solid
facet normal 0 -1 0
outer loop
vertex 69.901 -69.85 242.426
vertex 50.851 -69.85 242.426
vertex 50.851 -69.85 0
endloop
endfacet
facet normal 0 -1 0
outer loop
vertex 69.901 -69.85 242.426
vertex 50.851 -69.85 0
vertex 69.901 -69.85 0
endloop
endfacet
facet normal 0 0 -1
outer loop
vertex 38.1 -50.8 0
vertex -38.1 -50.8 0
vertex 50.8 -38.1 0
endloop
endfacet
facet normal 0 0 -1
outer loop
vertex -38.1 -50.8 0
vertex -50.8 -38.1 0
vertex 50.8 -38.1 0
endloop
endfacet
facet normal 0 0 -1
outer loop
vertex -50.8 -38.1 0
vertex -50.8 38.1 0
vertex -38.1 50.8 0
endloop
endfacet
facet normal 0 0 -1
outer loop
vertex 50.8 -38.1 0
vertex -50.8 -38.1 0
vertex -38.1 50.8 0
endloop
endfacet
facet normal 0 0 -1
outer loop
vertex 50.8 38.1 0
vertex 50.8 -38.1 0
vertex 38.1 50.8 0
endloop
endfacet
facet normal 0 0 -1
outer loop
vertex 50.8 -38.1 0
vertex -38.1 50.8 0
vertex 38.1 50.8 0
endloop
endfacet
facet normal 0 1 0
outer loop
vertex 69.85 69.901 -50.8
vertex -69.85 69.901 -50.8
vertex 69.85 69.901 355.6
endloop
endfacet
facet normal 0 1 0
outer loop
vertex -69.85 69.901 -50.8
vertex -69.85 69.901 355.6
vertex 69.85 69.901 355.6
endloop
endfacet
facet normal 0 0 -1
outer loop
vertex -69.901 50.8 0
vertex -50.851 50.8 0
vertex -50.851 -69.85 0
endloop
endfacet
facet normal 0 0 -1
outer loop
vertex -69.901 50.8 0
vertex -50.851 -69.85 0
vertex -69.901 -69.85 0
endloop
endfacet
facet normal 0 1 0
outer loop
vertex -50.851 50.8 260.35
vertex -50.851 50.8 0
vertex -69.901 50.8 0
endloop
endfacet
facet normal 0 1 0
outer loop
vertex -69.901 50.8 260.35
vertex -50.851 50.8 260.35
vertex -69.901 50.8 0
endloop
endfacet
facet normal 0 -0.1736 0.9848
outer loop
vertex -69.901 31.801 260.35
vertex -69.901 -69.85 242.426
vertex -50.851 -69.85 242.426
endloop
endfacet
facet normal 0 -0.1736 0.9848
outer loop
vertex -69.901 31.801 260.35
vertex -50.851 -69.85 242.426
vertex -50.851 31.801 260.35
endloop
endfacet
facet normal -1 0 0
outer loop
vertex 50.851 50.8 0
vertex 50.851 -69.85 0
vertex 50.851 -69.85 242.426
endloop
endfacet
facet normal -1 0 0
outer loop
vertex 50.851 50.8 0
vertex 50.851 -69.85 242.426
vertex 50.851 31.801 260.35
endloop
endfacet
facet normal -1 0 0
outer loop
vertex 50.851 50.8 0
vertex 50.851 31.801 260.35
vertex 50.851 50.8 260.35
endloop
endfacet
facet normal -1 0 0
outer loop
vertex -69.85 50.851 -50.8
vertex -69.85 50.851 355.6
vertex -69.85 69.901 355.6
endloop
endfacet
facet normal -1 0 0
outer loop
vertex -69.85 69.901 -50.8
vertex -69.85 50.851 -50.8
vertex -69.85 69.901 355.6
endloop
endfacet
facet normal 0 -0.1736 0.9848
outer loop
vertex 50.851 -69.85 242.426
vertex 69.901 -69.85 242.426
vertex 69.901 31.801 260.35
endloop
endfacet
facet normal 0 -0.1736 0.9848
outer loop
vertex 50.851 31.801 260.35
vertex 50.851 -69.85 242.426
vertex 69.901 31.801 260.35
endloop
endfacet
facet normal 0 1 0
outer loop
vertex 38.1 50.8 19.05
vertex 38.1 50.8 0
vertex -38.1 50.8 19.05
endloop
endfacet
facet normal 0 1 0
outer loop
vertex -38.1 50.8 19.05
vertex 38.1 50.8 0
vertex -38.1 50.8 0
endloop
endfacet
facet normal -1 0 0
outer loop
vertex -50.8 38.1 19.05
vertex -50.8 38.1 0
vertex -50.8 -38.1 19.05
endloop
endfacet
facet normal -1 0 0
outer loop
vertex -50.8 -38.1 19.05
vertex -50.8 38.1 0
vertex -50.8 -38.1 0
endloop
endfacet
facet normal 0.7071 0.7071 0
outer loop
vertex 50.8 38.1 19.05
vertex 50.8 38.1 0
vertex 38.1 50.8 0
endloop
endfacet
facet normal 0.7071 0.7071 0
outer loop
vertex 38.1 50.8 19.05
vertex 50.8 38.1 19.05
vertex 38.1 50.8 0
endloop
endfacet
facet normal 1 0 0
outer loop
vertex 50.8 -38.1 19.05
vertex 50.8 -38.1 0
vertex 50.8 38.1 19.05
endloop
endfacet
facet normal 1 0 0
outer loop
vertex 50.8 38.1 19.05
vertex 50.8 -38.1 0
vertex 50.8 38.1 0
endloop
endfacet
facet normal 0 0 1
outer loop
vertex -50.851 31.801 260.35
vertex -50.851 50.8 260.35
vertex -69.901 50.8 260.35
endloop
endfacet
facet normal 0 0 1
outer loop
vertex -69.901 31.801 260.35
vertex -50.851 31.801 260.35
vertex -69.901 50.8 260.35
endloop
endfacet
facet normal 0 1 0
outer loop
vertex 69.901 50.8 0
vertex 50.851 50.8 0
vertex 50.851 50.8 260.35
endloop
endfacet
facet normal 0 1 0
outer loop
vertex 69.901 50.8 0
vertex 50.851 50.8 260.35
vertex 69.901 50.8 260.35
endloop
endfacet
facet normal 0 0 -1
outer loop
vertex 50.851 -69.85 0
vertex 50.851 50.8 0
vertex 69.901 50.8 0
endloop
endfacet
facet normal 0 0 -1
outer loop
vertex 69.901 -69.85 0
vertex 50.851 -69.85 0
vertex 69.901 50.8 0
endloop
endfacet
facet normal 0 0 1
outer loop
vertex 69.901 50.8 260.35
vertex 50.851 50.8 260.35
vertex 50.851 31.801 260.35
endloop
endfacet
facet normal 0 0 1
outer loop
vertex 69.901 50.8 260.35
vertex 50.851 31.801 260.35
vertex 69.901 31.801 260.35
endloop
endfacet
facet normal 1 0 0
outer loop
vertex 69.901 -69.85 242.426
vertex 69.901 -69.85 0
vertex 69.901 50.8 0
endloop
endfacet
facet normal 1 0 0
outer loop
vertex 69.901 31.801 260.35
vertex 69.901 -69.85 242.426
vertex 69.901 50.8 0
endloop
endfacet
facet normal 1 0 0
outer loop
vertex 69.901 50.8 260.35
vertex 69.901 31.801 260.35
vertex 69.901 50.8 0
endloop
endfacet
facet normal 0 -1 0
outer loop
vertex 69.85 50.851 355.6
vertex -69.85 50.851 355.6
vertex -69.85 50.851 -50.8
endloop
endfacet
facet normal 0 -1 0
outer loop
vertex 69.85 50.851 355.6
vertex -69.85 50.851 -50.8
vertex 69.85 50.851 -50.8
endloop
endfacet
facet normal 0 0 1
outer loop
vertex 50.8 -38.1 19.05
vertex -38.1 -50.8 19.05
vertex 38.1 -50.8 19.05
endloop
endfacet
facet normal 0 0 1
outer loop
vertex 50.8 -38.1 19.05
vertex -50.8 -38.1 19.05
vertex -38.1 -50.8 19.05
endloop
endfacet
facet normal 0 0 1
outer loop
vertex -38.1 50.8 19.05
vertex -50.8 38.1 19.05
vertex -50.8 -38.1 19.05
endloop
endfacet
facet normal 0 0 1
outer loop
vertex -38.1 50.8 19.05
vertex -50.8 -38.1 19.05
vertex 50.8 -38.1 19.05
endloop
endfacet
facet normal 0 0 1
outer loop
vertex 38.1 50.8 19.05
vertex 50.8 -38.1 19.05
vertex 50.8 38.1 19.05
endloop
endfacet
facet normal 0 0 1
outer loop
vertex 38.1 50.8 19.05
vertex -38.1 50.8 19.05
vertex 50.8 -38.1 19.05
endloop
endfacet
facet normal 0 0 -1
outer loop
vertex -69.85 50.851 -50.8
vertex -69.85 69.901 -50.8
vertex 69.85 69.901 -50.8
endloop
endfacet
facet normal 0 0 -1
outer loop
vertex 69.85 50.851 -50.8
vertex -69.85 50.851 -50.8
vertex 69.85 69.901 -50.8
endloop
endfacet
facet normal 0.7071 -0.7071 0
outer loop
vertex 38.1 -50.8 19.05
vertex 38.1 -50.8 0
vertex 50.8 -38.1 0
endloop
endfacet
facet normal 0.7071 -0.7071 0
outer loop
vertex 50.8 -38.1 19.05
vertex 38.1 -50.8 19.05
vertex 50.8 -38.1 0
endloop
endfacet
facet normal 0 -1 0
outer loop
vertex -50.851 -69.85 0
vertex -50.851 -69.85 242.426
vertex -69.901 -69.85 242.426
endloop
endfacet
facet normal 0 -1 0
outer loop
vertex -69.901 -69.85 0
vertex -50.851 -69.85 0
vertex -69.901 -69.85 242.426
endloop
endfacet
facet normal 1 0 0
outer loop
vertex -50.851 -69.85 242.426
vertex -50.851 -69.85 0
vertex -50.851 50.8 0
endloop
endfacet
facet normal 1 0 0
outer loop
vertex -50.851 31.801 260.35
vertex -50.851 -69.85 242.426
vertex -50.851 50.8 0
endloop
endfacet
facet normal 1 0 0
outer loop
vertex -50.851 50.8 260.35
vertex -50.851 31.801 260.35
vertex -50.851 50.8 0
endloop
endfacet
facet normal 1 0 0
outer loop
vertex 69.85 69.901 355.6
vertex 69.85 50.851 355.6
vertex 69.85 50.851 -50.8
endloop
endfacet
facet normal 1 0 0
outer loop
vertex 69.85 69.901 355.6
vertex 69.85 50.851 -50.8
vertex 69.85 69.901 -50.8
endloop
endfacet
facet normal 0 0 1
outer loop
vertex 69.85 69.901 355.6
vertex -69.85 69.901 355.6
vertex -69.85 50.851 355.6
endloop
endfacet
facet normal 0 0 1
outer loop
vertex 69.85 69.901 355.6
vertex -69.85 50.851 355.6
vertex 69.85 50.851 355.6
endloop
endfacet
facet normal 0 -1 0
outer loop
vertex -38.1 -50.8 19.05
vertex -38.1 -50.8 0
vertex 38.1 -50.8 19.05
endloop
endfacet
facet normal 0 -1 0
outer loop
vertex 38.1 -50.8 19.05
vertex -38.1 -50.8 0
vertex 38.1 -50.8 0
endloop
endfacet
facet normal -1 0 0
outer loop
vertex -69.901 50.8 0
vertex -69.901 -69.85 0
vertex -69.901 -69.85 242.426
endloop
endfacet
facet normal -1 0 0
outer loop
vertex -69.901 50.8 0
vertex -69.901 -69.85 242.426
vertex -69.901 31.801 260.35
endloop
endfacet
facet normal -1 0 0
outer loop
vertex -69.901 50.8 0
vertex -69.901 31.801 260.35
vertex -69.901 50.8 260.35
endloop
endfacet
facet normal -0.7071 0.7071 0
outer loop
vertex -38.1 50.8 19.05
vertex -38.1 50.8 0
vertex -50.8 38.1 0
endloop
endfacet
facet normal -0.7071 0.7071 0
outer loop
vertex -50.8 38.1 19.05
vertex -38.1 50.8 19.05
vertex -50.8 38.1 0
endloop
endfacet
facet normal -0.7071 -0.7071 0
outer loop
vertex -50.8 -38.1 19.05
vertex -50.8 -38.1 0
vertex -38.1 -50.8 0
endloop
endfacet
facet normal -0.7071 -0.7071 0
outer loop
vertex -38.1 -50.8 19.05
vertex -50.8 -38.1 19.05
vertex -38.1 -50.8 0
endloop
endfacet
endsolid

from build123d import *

# Parameters (mm, degrees)
F1_DEPTH      = 19.05
F2_W          = 139.7
F2_H          = 19.05
F3_DEPTH      = 355.6
F3_DEPTH_BACK = 50.8
F4_W          = 19.05
F4_H          = 120.65
F5_DEPTH      = 260.35
F7_DEPTH      = 139.7518


with BuildPart() as f1:
    # F0 (on Top) → F1 (new body)
    with BuildSketch(Plane.XY):
        Polygon((-38.1, -50.8), (38.1, -50.8), (50.8, -38.1), (50.8, 38.1), (38.1, 50.8), (-38.1, 50.8), (-50.8, 38.1), (-50.8, -38.1), align=None)
    extrude(amount=F1_DEPTH)


with BuildPart() as f3:
    # F2 (on Top) → F3 (new body, two sides)
    with BuildSketch(Plane.XY) as f3_sk:
        with Locations((0, 60.3758)):
            Rectangle(F2_W, F2_H)
    extrude(amount=F3_DEPTH)
    extrude(f3_sk.sketch, amount=-F3_DEPTH_BACK)


with BuildPart() as f5:
    # F4 (on Top) → F5 (new body)
    with BuildSketch(Plane.XY):
        with Locations((60.3758, -9.525)):
            Rectangle(F4_W, F4_H)
    extrude(amount=F5_DEPTH)

    # F6 (on face) → F7 (cut, through all)
    with BuildSketch(Plane.YZ.offset(69.9008)):
        Polygon((31.8008, 260.35), (-69.85, 260.35), (-69.85, 242.426221), align=None)
    extrude(amount=-F7_DEPTH, mode=Mode.SUBTRACT)


with BuildPart() as f8_1:
    # F8: instance of F5
    add(f5.part.mirror(Plane.YZ))


solid = Compound([f1.part, f3.part, f5.part, f8_1.part])
